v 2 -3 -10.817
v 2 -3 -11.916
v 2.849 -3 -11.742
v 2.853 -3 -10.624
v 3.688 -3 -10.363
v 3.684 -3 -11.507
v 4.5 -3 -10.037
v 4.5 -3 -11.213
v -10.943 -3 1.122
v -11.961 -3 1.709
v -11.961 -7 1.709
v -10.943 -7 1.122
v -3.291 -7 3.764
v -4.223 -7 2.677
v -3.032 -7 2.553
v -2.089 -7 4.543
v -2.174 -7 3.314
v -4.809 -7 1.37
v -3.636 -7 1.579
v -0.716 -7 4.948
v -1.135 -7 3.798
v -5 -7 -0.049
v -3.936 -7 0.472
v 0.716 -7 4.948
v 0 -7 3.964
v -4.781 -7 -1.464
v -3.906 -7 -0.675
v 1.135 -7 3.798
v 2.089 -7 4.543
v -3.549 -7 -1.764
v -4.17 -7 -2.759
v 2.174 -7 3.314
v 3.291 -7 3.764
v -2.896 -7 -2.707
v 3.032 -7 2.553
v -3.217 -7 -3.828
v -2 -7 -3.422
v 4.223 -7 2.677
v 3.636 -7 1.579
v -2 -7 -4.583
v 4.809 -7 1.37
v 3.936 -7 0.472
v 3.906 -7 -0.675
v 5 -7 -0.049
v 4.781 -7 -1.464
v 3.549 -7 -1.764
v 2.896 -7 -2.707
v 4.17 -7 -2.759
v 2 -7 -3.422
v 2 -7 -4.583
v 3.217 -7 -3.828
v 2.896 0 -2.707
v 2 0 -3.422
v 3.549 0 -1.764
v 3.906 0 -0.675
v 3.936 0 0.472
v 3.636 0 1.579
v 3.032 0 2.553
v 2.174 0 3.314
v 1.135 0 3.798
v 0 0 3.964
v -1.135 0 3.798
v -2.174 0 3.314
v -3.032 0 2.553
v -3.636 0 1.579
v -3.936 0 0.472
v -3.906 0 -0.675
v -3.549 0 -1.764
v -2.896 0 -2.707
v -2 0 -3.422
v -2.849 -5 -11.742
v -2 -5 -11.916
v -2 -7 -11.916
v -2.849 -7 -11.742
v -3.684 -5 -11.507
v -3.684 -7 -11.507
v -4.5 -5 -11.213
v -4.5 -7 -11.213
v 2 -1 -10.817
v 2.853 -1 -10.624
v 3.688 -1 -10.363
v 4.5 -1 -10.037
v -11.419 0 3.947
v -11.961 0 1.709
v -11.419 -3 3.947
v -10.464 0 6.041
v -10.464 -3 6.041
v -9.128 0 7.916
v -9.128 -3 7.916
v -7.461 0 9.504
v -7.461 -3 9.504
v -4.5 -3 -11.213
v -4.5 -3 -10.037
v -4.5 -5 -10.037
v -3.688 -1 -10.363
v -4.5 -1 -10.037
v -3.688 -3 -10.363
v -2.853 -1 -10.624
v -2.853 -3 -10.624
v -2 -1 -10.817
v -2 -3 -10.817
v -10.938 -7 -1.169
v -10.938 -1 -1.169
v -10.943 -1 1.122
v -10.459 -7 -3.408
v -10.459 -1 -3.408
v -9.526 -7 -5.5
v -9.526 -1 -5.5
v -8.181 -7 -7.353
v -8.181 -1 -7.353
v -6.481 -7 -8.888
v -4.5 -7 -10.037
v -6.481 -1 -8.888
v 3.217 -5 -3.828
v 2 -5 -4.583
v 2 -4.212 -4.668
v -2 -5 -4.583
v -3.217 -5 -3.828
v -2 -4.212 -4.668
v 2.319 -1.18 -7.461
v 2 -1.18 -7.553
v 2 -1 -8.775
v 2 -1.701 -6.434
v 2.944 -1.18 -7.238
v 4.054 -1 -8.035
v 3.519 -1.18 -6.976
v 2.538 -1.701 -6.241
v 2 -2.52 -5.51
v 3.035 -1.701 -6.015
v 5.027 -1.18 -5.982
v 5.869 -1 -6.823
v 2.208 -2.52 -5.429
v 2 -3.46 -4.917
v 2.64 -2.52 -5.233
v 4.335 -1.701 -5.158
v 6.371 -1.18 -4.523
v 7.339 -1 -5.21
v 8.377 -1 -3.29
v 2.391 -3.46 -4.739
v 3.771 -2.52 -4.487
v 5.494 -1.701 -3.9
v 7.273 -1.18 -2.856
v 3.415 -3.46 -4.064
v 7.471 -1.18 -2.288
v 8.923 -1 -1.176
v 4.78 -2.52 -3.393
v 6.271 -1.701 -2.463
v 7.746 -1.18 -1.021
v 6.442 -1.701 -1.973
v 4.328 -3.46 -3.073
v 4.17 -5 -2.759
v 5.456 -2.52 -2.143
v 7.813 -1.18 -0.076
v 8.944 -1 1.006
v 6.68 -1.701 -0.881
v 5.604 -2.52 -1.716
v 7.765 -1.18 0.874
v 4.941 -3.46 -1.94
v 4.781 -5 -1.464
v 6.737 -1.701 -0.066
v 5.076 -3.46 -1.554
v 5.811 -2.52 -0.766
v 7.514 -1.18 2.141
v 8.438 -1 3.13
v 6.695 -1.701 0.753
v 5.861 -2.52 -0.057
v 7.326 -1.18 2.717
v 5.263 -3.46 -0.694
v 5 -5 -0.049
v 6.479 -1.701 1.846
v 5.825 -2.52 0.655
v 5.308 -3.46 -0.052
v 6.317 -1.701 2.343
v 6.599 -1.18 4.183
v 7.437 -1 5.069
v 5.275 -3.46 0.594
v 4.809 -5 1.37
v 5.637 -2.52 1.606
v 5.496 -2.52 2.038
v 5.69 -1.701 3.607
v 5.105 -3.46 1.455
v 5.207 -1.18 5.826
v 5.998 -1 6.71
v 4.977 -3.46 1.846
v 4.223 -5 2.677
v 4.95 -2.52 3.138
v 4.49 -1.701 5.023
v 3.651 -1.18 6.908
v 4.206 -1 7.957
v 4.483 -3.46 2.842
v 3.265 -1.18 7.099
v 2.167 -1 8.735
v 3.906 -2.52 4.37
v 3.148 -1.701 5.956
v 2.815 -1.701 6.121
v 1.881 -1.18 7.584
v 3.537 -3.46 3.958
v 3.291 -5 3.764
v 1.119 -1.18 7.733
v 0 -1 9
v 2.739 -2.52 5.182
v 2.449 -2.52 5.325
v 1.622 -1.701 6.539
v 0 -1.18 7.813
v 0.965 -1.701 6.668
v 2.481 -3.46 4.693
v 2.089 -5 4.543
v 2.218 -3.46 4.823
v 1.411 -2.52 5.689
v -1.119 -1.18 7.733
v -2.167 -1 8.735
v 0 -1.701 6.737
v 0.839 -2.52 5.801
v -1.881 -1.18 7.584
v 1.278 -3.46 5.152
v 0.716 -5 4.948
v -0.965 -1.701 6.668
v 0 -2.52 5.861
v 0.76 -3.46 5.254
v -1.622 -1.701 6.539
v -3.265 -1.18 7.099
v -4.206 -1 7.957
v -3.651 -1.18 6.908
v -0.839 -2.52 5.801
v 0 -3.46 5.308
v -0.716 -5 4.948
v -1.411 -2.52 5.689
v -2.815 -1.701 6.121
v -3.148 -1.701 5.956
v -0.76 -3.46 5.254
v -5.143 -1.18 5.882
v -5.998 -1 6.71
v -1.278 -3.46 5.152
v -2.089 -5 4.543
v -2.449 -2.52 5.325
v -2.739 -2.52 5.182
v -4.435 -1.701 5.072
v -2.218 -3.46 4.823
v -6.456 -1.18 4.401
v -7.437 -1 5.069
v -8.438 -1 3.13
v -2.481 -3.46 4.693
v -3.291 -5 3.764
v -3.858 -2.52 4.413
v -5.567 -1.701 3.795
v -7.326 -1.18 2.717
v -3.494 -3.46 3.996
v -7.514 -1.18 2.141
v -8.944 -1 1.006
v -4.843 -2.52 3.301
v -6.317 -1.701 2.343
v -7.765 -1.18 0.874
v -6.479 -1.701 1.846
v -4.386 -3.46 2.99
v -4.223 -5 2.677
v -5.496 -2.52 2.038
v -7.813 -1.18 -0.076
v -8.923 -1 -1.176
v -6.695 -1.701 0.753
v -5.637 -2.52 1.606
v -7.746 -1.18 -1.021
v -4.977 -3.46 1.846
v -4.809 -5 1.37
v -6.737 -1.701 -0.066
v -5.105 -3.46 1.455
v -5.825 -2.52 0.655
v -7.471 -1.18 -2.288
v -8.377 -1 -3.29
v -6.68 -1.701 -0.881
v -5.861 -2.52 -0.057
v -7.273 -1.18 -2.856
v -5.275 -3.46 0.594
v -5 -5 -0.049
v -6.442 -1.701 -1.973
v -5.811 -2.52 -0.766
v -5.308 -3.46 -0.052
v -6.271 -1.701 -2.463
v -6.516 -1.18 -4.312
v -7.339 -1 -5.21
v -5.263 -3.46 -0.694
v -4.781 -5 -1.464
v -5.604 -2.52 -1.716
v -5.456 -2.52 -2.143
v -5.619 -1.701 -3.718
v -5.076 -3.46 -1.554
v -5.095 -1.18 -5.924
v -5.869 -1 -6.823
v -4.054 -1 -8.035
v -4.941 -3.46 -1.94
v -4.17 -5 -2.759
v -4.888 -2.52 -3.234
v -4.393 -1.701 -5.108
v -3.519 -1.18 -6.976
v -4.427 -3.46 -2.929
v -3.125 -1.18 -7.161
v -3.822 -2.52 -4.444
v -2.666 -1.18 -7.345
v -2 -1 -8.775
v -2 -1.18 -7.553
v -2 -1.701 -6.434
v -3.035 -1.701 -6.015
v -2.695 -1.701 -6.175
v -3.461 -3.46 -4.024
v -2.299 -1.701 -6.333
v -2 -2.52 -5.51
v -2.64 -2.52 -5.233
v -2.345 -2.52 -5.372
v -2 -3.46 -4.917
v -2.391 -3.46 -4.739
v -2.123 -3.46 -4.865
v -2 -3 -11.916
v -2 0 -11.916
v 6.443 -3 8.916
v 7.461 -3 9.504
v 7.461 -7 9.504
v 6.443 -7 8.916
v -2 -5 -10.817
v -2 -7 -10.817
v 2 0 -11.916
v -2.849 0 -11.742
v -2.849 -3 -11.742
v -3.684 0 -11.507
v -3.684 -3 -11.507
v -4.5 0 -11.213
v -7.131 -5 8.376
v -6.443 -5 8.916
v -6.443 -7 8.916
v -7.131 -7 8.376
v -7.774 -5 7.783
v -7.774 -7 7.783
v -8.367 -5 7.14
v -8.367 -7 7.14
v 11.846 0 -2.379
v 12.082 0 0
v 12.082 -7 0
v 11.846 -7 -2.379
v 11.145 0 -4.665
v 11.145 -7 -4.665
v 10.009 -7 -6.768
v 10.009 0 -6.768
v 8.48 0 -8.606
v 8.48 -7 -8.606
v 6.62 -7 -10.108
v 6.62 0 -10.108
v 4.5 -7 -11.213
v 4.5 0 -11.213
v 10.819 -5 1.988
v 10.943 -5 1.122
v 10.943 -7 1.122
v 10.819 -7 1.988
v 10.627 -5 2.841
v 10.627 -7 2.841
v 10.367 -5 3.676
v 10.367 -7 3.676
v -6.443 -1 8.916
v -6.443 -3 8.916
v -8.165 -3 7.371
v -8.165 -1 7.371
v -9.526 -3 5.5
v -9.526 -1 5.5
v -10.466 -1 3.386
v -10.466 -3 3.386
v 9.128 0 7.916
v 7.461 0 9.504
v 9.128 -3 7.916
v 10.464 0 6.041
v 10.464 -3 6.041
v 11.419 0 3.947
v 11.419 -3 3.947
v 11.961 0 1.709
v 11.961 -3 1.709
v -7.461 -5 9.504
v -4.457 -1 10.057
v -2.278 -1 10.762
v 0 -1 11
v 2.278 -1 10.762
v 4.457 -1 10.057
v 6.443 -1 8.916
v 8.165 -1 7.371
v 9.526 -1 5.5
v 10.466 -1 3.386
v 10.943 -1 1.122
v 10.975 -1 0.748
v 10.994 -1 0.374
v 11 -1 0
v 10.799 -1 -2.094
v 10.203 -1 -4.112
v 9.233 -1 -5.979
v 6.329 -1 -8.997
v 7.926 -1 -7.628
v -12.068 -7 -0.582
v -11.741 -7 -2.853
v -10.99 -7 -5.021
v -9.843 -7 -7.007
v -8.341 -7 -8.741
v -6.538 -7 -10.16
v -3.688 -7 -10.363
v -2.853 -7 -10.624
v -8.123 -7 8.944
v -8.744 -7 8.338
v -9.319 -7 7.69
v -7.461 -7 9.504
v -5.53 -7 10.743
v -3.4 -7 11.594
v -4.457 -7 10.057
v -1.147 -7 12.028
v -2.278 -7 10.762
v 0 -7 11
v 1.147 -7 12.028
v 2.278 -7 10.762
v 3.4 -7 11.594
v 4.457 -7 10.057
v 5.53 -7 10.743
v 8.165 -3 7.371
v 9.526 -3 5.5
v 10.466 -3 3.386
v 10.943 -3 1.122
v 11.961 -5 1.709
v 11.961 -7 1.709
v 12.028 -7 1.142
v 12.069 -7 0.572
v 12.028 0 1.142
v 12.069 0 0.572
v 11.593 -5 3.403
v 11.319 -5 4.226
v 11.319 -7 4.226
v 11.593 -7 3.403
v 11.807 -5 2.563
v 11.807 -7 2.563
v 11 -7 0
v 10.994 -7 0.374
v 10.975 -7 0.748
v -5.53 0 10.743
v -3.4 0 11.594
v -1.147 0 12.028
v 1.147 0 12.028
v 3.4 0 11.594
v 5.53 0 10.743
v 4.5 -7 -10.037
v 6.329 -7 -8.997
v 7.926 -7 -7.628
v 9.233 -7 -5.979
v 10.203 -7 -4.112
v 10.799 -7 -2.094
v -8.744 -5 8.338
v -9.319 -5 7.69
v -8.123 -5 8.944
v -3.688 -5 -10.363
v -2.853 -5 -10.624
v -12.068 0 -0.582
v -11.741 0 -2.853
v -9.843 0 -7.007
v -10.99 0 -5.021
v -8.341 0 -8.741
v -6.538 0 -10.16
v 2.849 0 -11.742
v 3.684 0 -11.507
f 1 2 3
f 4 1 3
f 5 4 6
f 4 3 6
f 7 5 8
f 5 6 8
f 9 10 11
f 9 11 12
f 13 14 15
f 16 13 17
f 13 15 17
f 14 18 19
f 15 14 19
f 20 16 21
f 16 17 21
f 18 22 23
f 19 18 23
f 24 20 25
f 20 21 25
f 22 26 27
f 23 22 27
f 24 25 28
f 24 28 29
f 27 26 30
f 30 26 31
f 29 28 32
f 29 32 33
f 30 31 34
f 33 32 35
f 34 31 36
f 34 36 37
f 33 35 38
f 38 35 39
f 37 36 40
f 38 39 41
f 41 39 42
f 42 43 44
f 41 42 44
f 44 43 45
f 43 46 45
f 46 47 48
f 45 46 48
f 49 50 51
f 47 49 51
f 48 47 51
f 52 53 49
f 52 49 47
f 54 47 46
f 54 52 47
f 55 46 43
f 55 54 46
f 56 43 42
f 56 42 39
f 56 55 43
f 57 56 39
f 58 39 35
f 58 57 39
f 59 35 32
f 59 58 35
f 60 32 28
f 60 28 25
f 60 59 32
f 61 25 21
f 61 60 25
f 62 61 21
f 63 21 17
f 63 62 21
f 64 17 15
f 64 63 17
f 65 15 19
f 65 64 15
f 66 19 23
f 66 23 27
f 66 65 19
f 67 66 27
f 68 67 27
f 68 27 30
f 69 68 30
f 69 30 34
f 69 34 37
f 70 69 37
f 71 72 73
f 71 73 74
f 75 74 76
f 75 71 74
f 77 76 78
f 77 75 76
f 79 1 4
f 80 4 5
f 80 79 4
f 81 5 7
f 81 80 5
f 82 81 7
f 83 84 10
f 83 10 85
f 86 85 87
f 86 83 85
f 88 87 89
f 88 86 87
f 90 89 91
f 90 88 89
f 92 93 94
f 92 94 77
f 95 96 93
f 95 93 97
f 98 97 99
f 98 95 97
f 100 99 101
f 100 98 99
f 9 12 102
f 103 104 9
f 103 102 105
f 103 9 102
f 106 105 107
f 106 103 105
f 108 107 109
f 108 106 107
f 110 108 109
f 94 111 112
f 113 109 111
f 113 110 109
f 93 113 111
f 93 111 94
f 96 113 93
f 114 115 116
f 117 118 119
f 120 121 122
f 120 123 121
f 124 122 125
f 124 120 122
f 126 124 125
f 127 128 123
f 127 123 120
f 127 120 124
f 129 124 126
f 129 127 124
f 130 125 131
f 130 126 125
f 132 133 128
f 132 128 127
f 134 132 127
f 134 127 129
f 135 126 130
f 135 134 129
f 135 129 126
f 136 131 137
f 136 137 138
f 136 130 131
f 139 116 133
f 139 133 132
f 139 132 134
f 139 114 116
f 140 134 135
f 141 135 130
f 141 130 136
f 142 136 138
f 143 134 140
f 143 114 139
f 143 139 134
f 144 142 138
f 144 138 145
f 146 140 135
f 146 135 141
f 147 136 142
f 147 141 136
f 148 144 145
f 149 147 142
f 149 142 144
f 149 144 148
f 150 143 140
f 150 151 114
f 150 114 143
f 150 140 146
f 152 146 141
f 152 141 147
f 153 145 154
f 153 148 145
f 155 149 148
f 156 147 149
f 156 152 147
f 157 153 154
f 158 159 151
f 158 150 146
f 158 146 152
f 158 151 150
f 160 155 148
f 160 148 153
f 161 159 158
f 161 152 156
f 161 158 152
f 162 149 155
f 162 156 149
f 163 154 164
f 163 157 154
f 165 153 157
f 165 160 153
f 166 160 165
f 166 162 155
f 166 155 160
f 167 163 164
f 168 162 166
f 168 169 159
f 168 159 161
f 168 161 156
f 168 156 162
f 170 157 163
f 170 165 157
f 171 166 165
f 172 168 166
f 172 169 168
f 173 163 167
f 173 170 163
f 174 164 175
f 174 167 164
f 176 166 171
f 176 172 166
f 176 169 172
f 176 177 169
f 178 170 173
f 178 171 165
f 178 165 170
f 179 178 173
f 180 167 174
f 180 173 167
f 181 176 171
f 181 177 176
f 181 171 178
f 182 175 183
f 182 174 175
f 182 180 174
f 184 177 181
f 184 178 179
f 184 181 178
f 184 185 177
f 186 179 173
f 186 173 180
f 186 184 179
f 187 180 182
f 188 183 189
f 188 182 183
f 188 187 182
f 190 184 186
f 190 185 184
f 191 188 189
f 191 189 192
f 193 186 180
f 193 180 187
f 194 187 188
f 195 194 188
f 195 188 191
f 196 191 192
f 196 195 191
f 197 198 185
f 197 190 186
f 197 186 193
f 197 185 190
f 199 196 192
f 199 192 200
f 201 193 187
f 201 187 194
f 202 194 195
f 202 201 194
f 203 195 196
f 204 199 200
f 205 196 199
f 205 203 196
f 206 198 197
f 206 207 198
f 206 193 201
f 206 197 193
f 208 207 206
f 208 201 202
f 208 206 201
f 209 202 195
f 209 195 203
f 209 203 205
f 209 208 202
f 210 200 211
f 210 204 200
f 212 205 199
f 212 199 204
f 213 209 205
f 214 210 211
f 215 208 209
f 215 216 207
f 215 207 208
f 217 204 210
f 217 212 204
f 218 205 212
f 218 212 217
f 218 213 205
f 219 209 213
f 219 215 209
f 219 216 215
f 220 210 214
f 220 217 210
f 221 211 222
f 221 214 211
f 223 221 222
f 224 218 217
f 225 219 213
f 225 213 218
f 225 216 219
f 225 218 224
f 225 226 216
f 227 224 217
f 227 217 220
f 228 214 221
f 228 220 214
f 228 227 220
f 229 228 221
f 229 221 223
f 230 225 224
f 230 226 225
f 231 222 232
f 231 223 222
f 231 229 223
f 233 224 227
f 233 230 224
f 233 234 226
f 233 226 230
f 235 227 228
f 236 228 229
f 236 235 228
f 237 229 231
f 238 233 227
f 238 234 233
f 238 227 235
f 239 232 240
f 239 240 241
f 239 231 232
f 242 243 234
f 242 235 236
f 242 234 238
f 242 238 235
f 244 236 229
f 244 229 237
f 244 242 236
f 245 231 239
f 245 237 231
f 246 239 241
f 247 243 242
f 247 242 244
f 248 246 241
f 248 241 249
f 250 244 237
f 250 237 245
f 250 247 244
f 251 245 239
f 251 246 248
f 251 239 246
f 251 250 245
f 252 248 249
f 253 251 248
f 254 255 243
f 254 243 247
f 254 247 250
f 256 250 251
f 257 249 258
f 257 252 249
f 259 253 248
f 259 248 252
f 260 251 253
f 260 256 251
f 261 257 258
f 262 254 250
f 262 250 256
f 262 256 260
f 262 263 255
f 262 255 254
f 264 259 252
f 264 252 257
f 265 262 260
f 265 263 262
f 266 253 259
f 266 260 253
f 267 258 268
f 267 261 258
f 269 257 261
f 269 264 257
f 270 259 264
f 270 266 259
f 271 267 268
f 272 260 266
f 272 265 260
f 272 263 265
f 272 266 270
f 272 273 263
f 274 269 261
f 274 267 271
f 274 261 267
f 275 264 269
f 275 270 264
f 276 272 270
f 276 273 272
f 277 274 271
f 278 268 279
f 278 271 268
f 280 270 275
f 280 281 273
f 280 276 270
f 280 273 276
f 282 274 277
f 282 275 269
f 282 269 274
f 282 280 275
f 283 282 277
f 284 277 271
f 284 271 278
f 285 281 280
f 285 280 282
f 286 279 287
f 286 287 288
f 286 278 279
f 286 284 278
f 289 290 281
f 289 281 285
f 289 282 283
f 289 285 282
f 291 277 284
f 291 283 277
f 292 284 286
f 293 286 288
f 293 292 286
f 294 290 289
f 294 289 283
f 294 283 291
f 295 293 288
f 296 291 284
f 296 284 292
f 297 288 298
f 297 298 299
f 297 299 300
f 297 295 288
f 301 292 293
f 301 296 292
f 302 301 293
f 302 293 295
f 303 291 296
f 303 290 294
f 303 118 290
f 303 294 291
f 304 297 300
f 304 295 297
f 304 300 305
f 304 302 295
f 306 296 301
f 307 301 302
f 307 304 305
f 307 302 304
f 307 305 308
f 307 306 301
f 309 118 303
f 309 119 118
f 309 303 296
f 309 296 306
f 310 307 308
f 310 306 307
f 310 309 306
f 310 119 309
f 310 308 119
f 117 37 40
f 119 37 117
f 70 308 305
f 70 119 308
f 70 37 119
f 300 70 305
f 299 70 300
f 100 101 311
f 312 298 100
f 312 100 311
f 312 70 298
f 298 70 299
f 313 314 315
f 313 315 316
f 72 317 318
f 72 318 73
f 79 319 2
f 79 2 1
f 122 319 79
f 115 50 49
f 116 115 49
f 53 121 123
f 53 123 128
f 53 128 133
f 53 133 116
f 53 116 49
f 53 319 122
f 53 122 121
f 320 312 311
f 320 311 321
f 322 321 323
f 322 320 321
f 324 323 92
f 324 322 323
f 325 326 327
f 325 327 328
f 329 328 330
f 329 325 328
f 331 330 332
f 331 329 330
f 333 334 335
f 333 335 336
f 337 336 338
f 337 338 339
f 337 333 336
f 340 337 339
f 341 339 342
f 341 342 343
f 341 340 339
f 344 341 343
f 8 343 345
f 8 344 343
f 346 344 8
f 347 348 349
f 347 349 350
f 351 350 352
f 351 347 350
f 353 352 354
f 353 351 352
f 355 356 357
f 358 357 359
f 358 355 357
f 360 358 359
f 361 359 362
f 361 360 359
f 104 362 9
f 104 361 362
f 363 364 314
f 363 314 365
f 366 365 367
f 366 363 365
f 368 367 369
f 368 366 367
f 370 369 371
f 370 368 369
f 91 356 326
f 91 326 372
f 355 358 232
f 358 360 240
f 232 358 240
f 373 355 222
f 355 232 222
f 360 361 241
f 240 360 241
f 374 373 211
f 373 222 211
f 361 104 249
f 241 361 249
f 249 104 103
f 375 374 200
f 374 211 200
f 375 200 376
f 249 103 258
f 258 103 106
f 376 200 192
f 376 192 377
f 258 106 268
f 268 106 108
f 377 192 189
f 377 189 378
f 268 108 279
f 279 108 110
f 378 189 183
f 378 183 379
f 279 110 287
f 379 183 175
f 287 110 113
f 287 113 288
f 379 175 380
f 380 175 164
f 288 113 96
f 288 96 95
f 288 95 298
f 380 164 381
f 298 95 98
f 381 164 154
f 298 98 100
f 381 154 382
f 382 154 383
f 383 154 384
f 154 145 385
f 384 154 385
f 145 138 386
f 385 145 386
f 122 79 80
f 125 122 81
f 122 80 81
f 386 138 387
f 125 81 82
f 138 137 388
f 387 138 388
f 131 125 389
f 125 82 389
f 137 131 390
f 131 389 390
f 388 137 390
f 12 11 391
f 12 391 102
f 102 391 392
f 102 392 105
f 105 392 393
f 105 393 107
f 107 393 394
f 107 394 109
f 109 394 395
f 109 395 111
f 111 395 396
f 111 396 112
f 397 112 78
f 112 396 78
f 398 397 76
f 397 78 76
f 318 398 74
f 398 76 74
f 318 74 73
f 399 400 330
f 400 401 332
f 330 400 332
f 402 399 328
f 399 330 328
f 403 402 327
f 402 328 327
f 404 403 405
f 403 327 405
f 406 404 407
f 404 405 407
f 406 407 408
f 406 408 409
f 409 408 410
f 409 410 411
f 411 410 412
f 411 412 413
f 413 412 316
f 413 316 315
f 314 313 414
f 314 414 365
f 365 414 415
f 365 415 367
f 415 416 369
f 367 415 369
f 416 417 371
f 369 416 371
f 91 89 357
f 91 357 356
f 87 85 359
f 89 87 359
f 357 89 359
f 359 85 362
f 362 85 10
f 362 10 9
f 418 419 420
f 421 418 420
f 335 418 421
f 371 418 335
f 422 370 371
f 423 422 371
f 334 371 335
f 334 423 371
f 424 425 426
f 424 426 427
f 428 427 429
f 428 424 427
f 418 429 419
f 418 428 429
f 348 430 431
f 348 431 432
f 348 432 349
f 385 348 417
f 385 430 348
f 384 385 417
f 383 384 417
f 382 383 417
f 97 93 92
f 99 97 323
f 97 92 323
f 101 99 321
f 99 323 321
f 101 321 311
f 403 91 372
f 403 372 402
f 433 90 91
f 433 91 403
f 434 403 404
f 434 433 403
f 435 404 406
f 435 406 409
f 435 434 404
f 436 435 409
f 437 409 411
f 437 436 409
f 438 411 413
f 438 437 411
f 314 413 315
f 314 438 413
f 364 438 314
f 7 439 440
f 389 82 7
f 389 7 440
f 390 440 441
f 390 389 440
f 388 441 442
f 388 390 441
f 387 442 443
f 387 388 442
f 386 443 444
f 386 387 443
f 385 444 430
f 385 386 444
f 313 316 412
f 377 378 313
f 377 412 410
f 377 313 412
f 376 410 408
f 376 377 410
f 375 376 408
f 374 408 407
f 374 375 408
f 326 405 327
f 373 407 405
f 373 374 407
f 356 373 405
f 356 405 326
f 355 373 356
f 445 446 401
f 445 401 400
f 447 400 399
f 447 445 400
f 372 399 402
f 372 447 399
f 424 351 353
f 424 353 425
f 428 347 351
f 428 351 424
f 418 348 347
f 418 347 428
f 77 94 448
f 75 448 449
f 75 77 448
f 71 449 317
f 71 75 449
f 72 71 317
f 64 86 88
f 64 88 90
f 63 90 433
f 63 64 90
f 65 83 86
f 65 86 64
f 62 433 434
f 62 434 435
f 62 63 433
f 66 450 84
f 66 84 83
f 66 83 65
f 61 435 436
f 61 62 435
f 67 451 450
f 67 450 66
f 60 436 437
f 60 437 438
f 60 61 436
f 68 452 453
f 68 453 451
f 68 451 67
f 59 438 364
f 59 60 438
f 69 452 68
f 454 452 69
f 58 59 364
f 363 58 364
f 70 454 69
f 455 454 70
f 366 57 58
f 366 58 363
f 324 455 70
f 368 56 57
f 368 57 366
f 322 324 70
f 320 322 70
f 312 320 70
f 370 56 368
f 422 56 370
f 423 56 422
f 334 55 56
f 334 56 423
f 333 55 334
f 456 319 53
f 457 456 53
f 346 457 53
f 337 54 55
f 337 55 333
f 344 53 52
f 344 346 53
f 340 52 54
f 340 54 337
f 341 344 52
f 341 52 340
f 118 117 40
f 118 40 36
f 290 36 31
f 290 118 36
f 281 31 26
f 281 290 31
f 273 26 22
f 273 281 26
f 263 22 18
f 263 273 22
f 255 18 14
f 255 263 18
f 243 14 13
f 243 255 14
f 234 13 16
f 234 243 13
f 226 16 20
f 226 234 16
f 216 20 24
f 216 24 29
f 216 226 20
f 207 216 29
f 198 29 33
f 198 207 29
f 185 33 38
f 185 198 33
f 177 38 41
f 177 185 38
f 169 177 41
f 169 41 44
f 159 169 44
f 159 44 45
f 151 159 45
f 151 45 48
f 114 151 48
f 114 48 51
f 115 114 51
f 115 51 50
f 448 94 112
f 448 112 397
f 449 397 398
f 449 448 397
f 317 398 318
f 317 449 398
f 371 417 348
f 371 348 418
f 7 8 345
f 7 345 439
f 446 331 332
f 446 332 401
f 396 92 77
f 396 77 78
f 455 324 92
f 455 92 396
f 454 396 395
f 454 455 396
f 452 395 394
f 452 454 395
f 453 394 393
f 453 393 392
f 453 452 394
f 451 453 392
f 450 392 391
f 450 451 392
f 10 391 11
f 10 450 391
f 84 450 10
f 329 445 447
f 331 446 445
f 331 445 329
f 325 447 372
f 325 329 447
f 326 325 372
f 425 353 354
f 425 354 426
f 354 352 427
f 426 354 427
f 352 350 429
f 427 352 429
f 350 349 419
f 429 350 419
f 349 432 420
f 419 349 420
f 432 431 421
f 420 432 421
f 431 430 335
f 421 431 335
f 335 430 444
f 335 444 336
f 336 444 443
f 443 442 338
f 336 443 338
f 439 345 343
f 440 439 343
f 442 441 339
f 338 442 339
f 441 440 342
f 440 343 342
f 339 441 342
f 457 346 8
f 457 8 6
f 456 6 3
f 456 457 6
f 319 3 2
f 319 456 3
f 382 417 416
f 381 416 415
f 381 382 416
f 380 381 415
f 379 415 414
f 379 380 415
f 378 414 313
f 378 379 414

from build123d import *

# Parameters (mm, degrees)
BOSS_EXTRUDE3_DEPTH = 7
BOSS_EXTRUDE4_DEPTH = 1
BOSS_EXTRUDE5_DEPTH = 7
BOSS_EXTRUDE6_DEPTH = 3
BOSS_EXTRUDE7_START = -5
BOSS_EXTRUDE7_DEPTH = 2
FILLET1_R           = 4


with BuildPart() as part:
    # Sketch1 → Boss-Extrude3 (new body)
    with BuildSketch(Plane(origin=(0, 0, 0), x_dir=(1, 0, 0), z_dir=(0, 1, 0))):
        with BuildLine():
            Line((2, 4.582575695), (2, 3.422298687))
            ThreePointArc((2, 3.422298687), (0, -3.96385271), (-2, 3.422298687))
            Line((-2, 3.422298687), (-2, 4.582575695))
            ThreePointArc((-2, 4.582575695), (0, -5), (2, 4.582575695))
        make_face()
    extrude(amount=-BOSS_EXTRUDE3_DEPTH)

    # Sketch1<6> → Boss-Extrude4 (add)
    with BuildSketch(Plane(origin=(0, 0, 0), x_dir=(1, 0, 0), z_dir=(0, 1, 0))):
        with BuildLine():
            Line((2, 10.816653826), (2, 4.582575695))
            ThreePointArc((2, 4.582575695), (0, -5), (-2, 4.582575695))
            Line((-2, 4.582575695), (-2, 10.816653826))
            ThreePointArc((-2, 10.816653826), (0, -11), (2, 10.816653826))
        make_face()
    extrude(amount=-BOSS_EXTRUDE4_DEPTH)

    # Sketch1<7> → Boss-Extrude5 (add)
    with BuildSketch(Plane(origin=(0, 0, 0), x_dir=(1, 0, 0), z_dir=(0, 1, 0))):
        with BuildLine():
            ThreePointArc((-7.460787851, -9.503640297), (0, -12.082323214), (7.460787851, -9.503640297))
            Line((7.460787851, -9.503640297), (6.442669325, -8.915829292))
            ThreePointArc((6.442669325, -8.915829292), (0, -11), (-6.442669325, -8.915829292))
            Line((-6.442669325, -8.915829292), (-7.460787851, -9.503640297))
        make_face()
        with BuildLine():
            Line((10.942669325, -1.121600658), (11.960787851, -1.709411663))
            ThreePointArc((11.960787851, -1.709411663), (12.051901073, -0.856863332), (12.082323214, 0))
            ThreePointArc((12.082323214, 0), (10.008820827, 6.768015949), (4.5, 11.21305196))
            Line((4.5, 11.21305196), (4.5, 10.03742995))
            ThreePointArc((4.5, 10.03742995), (9.233092656, 5.979130372), (11, 0))
            ThreePointArc((11, 0), (10.985657982, -0.561532466), (10.942669325, -1.121600658))
        make_face()
        with BuildLine():
            ThreePointArc((-4.5, 11.21305196), (-10.46359884, 6.041161607), (-11.960787851, -1.709411663))
            Line((-11.960787851, -1.709411663), (-10.942669325, -1.121600658))
            ThreePointArc((-10.942669325, -1.121600658), (-9.526279442, 5.5), (-4.5, 10.03742995))
            Line((-4.5, 10.03742995), (-4.5, 11.21305196))
        make_face()
    extrude(amount=-BOSS_EXTRUDE5_DEPTH)

    # Sketch1<8> → Boss-Extrude6 (add)
    with BuildSketch(Plane(origin=(0, 0, 0), x_dir=(1, 0, 0), z_dir=(0, 1, 0))):
        with BuildLine():
            Line((11.960787851, -1.709411663), (10.942669325, -1.121600658))
            ThreePointArc((10.942669325, -1.121600658), (9.526279442, -5.5), (6.442669325, -8.915829292))
            Line((6.442669325, -8.915829292), (7.460787851, -9.503640297))
            ThreePointArc((7.460787851, -9.503640297), (10.46359884, -6.041161607), (11.960787851, -1.709411663))
        make_face()
        with BuildLine():
            Line((4.5, 10.03742995), (4.5, 11.21305196))
            ThreePointArc((4.5, 11.21305196), (3.268930764, 11.631707781), (2, 11.915642419))
            Line((2, 11.915642419), (2, 10.816653826))
            ThreePointArc((2, 10.816653826), (3.273270148, 10.501699983), (4.5, 10.03742995))
        make_face()
        with BuildLine():
            Line((-7.460787851, -9.503640297), (-6.442669325, -8.915829292))
            ThreePointArc((-6.442669325, -8.915829292), (-9.526279442, -5.5), (-10.942669325, -1.121600658))
            Line((-10.942669325, -1.121600658), (-11.960787851, -1.709411663))
            ThreePointArc((-11.960787851, -1.709411663), (-10.46359884, -6.041161607), (-7.460787851, -9.503640297))
        make_face()
        with BuildLine():
            Line((-2, 10.816653826), (-2, 11.915642419))
            ThreePointArc((-2, 11.915642419), (-3.268930764, 11.631707781), (-4.5, 11.21305196))
            Line((-4.5, 11.21305196), (-4.5, 10.03742995))
            ThreePointArc((-4.5, 10.03742995), (-3.273270148, 10.501699983), (-2, 10.816653826))
        make_face()
    extrude(amount=-BOSS_EXTRUDE6_DEPTH)

    # Sketch1<9> → Boss-Extrude7 (add)
    with BuildSketch(Plane(origin=(0, 0, 0), x_dir=(1, 0, 0), z_dir=(0, 1, 0)).offset(BOSS_EXTRUDE7_START)):
        with BuildLine():
            ThreePointArc((-9.319249037, -7.689872017), (-8.438889046, -8.646830975), (-7.460787851, -9.503640297))
            Line((-7.460787851, -9.503640297), (-6.442669325, -8.915829292))
            ThreePointArc((-6.442669325, -8.915829292), (-7.458103894, -8.085585093), (-8.367496998, -7.140377721))
            Line((-8.367496998, -7.140377721), (-9.319249037, -7.689872017))
        make_face()
        with BuildLine():
            ThreePointArc((11.319249037, -4.225770402), (11.70781981, -2.984876806), (11.960787851, -1.709411663))
            Line((11.960787851, -1.709411663), (10.942669325, -1.121600658))
            ThreePointArc((10.942669325, -1.121600658), (10.731374042, -2.41611489), (10.367496998, -3.676276106))
            Line((10.367496998, -3.676276106), (11.319249037, -4.225770402))
        make_face()
        with BuildLine():
            Line((-2, 10.816653826), (-2, 11.915642419))
            ThreePointArc((-2, 11.915642419), (-3.268930764, 11.631707781), (-4.5, 11.21305196))
            Line((-4.5, 11.21305196), (-4.5, 10.03742995))
            ThreePointArc((-4.5, 10.03742995), (-3.273270148, 10.501699983), (-2, 10.816653826))
        make_face()
    extrude(amount=-BOSS_EXTRUDE7_DEPTH)

    # Fillet1
    fillet1_edges = [part.edges().sort_by_distance(p)[0] for p in [
        (0, -1, 5),
    ]]
    fillet(fillet1_edges, radius=FILLET1_R)


solid = part.part
